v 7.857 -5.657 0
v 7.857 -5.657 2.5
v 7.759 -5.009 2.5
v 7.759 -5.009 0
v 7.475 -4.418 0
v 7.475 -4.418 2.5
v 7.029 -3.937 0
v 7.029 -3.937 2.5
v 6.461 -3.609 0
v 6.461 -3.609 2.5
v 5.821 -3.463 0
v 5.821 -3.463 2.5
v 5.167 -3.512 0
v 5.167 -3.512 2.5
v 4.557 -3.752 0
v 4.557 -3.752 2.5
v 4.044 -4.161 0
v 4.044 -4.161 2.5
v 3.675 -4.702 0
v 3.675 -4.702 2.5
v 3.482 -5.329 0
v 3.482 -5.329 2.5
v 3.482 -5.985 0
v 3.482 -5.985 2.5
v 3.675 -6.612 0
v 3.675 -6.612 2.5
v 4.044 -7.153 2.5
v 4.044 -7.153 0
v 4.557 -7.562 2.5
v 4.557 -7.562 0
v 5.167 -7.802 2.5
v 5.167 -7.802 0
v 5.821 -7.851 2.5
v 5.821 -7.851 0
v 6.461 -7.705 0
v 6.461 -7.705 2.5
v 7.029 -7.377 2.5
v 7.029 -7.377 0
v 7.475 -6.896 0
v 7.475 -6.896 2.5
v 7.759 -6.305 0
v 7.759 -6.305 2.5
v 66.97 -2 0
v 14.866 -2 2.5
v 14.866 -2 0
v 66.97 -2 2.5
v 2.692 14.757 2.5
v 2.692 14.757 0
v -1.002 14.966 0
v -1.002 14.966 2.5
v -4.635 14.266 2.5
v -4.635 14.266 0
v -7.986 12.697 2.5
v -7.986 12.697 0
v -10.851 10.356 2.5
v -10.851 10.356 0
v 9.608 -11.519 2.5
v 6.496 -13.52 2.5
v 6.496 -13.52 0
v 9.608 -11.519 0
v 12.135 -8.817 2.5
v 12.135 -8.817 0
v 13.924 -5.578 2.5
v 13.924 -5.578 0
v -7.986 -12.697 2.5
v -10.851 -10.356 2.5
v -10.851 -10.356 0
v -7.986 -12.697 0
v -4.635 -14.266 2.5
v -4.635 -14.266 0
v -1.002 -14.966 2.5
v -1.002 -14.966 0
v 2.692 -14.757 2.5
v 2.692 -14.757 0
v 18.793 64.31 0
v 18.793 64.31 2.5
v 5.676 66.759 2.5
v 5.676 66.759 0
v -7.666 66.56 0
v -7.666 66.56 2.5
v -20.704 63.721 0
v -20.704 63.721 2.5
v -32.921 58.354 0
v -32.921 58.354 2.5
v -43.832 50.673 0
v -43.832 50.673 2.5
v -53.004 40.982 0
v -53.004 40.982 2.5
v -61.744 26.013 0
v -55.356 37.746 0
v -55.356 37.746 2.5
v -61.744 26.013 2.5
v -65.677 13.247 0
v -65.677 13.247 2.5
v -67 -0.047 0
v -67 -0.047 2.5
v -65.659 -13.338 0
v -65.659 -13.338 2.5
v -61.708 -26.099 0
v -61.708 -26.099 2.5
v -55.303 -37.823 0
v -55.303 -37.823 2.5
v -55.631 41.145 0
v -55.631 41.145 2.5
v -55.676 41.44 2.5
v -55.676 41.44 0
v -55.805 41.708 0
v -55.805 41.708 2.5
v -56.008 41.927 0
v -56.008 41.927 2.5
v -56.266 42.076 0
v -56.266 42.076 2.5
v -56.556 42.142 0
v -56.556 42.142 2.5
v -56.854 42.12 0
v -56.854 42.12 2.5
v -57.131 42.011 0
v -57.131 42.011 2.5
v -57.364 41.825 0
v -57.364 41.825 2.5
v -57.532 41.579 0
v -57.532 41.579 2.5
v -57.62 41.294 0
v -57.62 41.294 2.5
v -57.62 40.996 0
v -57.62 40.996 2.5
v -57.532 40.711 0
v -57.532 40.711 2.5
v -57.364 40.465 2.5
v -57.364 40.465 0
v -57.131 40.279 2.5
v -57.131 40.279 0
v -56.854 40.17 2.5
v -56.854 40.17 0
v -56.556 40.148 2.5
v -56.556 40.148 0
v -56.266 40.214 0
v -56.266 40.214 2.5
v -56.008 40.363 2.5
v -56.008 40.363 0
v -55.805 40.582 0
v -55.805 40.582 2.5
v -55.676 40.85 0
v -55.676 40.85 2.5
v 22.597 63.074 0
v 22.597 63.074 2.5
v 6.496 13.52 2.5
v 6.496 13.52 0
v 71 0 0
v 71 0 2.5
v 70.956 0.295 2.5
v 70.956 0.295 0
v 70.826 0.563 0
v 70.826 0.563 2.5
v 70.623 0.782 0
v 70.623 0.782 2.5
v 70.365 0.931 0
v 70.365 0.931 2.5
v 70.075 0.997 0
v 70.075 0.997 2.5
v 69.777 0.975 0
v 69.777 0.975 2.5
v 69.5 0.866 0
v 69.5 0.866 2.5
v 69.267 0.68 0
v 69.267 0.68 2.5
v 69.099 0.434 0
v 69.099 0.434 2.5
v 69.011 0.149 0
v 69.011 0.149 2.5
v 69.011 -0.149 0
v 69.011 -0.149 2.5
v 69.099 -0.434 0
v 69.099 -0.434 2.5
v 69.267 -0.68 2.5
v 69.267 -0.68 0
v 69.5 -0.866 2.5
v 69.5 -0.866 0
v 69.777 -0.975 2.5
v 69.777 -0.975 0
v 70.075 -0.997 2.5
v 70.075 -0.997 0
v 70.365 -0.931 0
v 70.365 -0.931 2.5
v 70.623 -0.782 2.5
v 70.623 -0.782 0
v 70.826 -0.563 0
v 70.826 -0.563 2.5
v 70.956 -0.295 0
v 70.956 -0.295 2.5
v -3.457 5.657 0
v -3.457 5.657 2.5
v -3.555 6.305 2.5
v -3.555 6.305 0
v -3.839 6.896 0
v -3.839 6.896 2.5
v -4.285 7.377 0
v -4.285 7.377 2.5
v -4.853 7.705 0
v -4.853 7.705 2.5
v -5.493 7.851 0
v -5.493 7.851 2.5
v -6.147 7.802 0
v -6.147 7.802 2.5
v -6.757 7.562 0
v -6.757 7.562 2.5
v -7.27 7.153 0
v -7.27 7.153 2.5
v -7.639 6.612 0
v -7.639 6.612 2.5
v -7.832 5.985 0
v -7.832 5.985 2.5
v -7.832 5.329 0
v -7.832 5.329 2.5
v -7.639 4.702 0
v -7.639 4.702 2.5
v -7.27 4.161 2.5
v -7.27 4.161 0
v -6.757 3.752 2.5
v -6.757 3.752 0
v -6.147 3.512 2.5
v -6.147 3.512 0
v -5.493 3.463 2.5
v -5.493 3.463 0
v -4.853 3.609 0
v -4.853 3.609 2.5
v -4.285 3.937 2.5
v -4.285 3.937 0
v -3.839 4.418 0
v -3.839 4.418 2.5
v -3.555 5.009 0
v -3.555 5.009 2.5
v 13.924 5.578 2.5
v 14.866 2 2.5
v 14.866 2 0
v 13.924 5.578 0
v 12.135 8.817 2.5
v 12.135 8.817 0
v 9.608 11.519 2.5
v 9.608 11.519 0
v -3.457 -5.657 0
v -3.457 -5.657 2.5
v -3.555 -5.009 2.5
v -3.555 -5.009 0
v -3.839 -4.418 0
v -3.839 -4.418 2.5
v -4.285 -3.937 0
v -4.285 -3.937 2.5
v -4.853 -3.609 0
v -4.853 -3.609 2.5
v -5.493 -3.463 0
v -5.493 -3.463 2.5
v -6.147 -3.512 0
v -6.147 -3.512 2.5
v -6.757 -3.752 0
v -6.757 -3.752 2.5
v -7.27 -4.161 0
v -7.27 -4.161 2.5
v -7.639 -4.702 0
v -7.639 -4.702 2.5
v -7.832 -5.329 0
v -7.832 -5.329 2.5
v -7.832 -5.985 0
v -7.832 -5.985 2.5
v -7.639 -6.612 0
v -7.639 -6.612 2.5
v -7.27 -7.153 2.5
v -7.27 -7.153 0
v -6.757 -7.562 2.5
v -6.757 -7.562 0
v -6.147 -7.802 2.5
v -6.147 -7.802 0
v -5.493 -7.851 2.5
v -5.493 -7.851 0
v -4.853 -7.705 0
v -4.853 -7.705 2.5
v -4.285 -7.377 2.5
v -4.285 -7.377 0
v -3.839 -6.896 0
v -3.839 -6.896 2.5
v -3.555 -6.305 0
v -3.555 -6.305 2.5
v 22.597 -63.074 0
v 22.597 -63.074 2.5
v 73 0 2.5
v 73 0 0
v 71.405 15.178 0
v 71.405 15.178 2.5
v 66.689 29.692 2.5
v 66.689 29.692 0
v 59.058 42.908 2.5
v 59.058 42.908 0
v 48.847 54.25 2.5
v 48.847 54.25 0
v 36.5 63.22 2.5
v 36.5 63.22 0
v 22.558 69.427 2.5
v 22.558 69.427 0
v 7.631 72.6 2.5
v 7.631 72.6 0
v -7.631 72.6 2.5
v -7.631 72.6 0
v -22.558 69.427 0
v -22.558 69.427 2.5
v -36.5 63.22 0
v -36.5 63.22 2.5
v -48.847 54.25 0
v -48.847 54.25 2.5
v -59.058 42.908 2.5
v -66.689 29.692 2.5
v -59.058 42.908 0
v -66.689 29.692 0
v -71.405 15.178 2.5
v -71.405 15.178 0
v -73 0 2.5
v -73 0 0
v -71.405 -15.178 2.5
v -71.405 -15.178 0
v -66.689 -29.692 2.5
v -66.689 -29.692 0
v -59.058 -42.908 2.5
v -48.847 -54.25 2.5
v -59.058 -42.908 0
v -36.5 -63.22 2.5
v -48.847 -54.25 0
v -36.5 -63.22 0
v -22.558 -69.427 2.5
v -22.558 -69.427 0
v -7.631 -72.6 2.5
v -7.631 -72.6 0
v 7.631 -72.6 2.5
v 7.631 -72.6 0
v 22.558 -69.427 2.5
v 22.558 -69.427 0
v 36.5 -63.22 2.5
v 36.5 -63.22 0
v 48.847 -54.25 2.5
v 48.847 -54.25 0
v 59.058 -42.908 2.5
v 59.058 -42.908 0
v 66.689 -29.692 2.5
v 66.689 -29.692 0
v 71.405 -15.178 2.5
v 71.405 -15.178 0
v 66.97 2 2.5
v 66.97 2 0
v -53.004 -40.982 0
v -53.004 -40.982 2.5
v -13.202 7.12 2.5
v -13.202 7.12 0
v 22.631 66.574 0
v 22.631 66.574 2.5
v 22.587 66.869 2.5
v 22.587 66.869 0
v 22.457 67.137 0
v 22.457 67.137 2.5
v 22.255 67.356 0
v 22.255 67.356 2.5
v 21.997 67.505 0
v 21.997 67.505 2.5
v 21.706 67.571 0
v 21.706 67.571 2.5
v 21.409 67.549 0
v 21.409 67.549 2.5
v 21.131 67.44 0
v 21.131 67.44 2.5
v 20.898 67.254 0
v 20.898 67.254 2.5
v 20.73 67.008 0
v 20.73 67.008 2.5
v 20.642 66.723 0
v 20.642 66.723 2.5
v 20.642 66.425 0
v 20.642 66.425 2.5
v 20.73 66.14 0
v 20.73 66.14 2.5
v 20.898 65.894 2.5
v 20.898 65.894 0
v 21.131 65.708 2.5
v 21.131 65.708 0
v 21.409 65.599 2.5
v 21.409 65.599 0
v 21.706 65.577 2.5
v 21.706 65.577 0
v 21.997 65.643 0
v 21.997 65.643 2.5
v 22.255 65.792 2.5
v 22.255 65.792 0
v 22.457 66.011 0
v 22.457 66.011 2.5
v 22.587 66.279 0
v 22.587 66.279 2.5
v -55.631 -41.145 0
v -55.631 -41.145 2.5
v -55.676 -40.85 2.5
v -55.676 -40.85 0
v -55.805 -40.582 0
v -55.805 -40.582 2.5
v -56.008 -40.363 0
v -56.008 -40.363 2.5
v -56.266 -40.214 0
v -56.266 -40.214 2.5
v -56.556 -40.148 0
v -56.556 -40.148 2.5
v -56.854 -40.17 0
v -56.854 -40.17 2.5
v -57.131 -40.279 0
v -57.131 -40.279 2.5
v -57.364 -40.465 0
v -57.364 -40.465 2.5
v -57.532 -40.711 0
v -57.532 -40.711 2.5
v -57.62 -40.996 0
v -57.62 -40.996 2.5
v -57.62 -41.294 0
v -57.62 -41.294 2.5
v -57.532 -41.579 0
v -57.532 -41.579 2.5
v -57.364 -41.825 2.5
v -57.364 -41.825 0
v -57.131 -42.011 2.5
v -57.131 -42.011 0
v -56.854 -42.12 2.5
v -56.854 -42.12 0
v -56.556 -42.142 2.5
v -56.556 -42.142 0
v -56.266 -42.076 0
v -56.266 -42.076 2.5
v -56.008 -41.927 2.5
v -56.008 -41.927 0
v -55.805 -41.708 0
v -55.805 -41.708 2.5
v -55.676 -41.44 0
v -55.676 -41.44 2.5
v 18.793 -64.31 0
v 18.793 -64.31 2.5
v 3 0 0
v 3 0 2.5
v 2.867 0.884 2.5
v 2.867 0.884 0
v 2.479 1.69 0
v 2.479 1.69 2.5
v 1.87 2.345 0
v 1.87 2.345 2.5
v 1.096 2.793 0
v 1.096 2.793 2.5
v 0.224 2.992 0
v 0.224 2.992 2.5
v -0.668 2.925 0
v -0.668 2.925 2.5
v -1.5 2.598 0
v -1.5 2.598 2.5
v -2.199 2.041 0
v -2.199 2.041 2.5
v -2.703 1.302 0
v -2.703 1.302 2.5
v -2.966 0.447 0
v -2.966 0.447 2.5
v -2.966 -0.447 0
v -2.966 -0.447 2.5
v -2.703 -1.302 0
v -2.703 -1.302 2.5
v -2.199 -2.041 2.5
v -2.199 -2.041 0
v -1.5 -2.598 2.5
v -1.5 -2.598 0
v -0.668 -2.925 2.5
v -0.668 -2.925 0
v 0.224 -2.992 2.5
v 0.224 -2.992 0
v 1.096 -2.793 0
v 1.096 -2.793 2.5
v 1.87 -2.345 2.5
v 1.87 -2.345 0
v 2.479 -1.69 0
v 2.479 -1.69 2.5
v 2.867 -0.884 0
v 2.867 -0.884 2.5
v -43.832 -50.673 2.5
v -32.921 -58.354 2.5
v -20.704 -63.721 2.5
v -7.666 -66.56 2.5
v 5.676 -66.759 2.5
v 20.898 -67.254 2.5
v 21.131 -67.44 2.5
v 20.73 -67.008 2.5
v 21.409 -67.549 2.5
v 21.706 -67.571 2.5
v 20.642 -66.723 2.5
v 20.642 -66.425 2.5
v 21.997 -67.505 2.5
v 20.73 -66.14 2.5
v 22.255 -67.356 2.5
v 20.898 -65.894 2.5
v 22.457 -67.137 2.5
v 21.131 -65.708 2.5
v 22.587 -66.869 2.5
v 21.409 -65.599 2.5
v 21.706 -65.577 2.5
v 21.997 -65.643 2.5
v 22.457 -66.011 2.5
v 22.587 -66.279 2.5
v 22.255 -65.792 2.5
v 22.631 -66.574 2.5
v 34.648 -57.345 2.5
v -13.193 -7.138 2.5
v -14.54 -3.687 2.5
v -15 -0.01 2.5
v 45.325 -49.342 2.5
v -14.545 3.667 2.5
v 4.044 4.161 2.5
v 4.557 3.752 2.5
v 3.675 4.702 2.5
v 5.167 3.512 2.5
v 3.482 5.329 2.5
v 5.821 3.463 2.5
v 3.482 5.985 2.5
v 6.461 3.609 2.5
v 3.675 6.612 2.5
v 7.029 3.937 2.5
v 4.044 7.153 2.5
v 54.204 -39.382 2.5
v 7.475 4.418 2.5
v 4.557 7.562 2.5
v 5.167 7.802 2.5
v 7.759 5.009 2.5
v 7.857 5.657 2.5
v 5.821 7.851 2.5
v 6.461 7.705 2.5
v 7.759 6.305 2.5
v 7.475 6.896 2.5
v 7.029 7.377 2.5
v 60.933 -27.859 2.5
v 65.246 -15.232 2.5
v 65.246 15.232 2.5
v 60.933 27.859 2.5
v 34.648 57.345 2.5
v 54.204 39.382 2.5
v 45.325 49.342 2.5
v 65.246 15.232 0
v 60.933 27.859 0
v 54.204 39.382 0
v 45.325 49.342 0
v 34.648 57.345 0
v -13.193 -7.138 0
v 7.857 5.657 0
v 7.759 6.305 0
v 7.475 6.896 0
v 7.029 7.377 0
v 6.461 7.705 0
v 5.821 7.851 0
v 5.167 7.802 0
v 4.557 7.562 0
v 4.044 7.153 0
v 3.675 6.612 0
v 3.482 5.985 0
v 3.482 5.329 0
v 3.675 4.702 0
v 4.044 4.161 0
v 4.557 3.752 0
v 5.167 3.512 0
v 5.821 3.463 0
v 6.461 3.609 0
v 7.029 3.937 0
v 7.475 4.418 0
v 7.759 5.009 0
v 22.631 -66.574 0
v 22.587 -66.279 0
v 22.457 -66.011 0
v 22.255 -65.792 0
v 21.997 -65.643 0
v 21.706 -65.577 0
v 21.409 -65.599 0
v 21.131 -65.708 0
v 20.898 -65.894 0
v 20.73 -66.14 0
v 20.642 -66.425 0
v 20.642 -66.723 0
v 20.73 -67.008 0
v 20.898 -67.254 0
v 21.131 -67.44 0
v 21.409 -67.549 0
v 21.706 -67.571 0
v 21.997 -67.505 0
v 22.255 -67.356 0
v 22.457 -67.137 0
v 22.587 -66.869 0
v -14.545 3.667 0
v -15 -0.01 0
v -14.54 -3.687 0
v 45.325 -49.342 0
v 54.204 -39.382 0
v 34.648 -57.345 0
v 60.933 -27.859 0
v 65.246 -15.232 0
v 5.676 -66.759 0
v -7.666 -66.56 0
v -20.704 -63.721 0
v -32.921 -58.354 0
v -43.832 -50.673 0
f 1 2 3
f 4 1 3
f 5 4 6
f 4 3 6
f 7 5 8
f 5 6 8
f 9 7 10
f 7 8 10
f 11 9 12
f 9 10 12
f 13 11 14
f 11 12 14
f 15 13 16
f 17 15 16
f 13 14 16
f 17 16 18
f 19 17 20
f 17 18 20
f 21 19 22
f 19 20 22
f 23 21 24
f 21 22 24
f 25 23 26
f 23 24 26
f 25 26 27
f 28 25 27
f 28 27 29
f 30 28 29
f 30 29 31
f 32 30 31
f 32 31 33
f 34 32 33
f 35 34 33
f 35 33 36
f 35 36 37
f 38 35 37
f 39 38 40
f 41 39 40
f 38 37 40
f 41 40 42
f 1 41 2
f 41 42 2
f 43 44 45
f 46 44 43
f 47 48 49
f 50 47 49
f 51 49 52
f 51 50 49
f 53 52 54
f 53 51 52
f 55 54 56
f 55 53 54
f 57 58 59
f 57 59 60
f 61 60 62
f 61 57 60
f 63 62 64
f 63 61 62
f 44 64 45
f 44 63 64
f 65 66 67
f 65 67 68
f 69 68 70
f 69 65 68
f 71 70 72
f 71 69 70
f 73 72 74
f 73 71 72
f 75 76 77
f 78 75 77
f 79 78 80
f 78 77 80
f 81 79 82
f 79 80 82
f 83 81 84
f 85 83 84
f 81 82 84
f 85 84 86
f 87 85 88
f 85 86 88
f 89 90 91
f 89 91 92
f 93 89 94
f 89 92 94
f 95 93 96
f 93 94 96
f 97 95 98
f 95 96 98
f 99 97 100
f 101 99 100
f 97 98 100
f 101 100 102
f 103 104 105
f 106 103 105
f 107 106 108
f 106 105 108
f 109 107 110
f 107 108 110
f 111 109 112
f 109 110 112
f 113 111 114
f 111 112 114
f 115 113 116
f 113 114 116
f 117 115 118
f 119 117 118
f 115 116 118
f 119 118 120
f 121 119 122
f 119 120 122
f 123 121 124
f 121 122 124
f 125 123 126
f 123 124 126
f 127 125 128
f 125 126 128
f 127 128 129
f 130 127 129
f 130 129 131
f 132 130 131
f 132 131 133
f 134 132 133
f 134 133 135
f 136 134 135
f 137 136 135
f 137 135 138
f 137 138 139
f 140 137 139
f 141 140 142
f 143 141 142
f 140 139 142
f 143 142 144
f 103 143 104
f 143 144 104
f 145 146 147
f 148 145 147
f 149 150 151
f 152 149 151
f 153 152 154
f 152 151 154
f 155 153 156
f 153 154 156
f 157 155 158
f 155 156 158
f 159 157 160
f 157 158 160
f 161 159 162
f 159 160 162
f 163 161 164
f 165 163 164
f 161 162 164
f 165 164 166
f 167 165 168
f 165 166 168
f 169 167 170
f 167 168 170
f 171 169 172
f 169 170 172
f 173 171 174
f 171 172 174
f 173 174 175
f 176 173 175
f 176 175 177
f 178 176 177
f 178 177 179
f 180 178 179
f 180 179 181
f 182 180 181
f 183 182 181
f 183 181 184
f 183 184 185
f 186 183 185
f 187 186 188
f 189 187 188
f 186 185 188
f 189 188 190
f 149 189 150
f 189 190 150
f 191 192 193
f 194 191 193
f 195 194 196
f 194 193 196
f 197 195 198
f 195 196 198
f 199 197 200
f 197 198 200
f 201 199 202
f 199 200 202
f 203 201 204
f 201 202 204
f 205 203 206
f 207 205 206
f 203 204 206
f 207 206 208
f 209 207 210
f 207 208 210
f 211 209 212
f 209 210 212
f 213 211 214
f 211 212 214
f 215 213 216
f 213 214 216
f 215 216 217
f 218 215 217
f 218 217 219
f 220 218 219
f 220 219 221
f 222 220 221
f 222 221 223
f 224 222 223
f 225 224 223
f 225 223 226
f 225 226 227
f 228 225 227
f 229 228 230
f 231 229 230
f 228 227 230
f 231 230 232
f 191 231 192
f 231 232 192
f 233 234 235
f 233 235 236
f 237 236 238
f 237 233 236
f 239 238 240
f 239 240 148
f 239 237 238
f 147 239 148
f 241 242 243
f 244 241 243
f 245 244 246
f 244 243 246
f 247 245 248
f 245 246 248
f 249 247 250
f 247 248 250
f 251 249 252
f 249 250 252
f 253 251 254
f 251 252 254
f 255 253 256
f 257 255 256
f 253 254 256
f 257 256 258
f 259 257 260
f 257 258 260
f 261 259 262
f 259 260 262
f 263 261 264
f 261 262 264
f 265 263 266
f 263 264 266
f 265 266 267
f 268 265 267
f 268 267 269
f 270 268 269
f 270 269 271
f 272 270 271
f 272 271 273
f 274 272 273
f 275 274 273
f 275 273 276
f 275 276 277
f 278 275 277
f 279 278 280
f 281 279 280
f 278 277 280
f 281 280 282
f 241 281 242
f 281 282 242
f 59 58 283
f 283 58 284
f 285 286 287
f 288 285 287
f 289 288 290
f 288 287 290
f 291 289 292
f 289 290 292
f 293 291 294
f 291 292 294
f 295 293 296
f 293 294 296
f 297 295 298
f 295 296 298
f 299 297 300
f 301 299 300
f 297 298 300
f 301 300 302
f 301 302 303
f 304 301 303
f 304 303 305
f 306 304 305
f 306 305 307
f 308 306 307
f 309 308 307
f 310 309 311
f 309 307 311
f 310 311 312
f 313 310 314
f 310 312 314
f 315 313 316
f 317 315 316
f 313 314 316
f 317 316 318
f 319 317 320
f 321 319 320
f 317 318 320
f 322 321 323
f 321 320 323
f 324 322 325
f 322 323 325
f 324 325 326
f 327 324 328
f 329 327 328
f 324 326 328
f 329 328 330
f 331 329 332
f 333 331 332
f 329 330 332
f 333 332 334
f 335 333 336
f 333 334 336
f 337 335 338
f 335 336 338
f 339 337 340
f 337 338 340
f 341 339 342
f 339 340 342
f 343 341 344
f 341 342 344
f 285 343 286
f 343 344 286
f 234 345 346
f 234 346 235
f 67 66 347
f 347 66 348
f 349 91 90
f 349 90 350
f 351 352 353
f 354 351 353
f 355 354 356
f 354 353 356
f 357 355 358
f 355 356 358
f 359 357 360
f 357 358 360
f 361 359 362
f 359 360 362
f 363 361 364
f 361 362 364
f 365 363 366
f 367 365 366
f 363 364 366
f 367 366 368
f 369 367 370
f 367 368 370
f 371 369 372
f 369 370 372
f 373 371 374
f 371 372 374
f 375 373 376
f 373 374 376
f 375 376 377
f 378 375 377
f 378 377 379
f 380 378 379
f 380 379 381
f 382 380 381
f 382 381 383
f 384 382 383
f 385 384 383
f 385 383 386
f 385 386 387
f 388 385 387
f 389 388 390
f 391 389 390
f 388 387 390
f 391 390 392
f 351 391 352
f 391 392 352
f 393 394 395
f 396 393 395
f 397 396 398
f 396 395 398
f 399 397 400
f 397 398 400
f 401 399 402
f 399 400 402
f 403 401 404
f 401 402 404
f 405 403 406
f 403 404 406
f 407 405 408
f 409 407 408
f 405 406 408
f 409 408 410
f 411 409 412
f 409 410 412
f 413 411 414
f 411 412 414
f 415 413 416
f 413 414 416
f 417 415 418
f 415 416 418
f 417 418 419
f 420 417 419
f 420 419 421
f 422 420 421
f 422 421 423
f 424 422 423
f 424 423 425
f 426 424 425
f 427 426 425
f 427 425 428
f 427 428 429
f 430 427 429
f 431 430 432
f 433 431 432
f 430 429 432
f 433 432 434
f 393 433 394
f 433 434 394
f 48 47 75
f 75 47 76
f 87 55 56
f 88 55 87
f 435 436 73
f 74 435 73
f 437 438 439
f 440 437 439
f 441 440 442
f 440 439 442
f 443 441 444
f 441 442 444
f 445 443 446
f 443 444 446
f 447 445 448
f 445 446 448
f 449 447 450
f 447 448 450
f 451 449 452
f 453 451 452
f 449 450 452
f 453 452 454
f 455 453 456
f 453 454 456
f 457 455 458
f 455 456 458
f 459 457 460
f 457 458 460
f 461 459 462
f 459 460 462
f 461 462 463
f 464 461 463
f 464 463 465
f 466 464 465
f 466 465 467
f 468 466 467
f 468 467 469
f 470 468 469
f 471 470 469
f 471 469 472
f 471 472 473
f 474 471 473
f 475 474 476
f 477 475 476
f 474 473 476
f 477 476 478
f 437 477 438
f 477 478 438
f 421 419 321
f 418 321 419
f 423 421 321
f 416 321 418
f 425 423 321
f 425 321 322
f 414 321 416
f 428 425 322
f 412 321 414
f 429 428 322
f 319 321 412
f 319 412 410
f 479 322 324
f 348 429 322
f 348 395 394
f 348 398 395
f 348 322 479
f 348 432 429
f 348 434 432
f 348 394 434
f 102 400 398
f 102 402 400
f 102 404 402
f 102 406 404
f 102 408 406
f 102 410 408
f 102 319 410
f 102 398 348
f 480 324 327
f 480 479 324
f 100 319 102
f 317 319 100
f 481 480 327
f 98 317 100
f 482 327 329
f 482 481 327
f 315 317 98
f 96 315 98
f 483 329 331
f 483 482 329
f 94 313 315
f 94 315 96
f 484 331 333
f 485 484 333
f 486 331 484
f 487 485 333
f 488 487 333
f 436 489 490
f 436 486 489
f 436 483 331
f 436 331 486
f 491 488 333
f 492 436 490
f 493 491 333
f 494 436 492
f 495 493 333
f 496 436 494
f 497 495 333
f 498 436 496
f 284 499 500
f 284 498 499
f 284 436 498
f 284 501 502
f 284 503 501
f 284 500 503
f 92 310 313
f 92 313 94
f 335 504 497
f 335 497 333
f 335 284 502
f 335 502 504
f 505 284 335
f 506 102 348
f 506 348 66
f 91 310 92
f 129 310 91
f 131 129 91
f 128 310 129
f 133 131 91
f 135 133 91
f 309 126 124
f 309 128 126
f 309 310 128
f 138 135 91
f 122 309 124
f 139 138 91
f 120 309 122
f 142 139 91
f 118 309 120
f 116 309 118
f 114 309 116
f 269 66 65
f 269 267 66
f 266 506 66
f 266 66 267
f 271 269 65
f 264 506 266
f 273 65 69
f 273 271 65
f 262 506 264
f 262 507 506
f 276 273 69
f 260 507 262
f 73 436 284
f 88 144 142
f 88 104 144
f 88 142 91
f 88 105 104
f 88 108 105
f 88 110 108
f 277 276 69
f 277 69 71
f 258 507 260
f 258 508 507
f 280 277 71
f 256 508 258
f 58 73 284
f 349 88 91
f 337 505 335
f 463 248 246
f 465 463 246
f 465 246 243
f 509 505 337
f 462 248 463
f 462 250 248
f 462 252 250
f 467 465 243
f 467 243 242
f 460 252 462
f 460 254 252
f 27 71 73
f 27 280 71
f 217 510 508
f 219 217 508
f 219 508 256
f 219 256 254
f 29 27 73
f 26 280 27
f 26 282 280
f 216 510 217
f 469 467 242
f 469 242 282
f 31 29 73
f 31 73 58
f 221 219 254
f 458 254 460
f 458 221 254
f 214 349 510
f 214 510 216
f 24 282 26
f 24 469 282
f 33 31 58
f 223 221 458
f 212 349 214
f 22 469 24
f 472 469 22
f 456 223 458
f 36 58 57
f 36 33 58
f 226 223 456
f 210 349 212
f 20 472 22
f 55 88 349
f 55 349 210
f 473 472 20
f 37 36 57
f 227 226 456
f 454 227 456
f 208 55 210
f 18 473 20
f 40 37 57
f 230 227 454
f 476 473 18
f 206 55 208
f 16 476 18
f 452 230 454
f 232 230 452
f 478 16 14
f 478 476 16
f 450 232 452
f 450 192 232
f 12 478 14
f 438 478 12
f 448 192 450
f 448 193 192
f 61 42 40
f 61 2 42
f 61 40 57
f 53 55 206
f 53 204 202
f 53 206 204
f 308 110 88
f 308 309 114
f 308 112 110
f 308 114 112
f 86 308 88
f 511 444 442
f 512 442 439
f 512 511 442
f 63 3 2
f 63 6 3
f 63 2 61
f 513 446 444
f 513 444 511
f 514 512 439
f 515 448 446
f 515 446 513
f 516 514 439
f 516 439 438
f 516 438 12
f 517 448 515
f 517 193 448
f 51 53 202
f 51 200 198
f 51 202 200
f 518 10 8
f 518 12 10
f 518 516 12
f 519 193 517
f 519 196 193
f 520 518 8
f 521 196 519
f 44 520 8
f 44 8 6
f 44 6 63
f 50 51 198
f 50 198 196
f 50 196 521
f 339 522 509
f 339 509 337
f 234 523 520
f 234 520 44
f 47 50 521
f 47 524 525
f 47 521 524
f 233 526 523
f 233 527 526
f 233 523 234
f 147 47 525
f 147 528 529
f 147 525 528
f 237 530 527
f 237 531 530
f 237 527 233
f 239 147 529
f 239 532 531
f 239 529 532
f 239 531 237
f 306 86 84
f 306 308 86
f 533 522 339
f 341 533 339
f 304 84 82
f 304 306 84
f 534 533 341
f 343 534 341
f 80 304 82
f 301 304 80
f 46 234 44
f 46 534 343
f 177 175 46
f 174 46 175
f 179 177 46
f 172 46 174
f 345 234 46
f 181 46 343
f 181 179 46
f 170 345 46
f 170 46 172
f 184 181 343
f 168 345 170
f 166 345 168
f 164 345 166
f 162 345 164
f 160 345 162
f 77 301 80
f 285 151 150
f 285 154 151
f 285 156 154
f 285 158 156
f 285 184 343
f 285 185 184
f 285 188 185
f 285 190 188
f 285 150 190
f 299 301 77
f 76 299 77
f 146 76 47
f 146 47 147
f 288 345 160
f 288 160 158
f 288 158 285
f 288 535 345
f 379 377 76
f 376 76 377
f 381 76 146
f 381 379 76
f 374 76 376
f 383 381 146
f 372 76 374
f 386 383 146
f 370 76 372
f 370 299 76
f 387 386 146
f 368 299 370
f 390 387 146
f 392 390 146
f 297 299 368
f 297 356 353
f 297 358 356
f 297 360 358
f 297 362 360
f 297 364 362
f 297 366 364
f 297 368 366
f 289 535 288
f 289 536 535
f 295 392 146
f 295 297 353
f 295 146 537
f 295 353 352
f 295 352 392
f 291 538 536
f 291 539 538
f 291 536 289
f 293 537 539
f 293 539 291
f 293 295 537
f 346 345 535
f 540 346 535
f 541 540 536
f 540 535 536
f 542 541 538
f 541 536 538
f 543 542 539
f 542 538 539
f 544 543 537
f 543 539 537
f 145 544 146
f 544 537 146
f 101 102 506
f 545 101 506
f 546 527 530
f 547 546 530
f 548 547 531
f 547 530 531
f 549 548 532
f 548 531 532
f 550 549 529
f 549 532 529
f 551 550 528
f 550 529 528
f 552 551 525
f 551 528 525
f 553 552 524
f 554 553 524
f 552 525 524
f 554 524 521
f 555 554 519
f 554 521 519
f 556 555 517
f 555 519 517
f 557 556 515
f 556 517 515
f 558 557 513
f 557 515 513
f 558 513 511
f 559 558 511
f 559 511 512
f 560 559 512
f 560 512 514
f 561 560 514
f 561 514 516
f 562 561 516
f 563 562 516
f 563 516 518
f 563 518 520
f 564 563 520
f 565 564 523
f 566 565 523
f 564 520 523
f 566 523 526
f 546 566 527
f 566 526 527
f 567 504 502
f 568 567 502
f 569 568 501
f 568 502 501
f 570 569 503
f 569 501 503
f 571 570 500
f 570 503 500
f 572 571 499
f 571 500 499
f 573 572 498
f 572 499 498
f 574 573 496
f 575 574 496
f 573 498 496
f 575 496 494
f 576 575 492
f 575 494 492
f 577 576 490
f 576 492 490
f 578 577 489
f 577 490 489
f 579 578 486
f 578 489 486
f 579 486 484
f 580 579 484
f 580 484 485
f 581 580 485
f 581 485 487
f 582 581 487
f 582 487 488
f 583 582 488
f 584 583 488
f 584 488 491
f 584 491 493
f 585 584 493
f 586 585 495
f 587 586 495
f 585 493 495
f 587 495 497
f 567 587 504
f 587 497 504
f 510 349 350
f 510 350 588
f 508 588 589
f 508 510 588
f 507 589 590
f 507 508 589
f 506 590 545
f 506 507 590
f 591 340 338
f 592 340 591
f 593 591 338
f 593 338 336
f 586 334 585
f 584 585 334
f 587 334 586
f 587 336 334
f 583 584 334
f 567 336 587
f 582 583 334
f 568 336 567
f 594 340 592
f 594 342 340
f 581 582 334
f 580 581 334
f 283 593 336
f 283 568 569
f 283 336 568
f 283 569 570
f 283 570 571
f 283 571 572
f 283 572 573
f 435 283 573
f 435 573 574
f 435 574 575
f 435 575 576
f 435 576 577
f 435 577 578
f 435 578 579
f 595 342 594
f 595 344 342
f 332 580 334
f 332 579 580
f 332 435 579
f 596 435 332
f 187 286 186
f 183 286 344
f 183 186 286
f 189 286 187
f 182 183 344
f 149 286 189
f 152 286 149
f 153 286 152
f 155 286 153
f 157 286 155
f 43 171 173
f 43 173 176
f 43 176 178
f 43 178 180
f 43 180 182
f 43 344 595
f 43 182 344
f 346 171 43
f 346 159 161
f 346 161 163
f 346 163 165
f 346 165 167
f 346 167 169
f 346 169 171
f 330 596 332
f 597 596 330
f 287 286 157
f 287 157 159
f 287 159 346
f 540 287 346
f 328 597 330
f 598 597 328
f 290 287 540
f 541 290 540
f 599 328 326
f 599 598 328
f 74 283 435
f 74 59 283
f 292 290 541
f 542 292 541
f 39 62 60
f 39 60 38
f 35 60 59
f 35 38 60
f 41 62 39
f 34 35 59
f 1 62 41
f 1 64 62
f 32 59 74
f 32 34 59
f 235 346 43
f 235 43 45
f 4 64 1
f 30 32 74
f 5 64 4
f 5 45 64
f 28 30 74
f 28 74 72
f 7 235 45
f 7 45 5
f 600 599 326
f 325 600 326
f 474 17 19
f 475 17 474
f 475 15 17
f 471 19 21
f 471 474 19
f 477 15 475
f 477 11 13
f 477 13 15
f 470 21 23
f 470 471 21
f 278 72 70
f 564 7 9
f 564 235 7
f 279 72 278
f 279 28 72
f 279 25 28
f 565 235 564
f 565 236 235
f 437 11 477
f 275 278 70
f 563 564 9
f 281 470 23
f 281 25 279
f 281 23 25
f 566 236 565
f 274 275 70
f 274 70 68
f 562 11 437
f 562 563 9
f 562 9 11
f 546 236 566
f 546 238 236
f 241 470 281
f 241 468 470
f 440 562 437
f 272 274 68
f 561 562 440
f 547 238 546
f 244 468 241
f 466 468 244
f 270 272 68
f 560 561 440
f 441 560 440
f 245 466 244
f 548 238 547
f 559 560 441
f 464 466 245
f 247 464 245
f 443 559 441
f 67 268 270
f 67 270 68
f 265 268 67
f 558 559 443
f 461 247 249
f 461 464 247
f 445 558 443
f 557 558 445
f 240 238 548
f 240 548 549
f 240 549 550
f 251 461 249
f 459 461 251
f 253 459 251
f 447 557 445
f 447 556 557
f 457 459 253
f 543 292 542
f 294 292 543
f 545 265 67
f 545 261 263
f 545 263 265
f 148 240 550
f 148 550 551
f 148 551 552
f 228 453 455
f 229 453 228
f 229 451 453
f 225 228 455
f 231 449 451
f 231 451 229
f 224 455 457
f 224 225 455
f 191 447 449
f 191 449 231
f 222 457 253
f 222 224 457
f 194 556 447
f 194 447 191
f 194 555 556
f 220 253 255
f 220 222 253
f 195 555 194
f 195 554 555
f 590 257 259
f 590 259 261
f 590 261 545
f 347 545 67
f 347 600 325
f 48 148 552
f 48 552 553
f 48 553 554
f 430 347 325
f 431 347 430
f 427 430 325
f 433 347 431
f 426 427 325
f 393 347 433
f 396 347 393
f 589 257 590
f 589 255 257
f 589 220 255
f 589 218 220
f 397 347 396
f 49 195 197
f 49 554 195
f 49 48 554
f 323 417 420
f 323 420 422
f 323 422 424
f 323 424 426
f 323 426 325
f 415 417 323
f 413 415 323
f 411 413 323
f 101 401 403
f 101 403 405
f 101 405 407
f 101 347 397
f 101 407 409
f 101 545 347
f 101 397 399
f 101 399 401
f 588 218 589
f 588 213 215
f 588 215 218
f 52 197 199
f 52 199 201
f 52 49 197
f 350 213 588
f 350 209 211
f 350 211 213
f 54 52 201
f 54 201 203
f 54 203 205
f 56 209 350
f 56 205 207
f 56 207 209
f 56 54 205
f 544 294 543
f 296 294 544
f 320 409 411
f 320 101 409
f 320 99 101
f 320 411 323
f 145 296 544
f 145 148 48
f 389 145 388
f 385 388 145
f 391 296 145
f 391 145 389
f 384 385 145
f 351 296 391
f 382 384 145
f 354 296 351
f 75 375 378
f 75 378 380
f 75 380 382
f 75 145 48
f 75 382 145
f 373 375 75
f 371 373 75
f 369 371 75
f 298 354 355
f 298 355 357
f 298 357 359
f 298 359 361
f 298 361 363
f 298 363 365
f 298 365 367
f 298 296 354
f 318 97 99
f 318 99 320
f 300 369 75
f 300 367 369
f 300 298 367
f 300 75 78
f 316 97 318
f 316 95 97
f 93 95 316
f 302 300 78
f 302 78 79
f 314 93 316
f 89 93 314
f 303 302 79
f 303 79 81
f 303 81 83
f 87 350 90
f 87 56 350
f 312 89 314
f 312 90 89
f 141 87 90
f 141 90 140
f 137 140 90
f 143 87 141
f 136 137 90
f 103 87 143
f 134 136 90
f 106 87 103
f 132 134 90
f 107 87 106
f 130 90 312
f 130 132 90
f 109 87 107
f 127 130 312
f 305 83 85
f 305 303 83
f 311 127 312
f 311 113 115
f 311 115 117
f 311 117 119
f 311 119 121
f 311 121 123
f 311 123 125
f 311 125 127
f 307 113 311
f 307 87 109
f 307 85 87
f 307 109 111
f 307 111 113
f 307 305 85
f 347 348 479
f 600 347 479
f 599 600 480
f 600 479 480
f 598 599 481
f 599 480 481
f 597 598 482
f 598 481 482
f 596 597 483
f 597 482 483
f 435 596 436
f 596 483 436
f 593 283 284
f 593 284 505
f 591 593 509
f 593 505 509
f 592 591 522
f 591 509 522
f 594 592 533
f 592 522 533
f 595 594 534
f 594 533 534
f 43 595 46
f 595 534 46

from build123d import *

# Parameters (mm, degrees)
SKETCH_3_R          = 73
EXTRUDE_3_DEPTH     = 2.5
SKETCH_5_R          = 67
CUT_EXTRUDE_1_DEPTH = 2.5
SKETCH_6_R          = 15
EXTRUDE_4_DEPTH     = 2.5
SKETCH_7_R          = 8
CUT_EXTRUDE_2_DEPTH = 2.5
EXTRUDE_6_DEPTH     = 2.5
EXTRUDE_7_DEPTH     = 2.5
EXTRUDE_8_DEPTH     = 2.5
EXTRUDE_9_DEPTH     = 2.5
EXTRUDE_10_DEPTH    = 2.5
SKETCH_14_R         = 8
CUT_EXTRUDE_3_DEPTH = 2.5
SKETCH_15_R         = 1
CUT_EXTRUDE_4_DEPTH = 2.5
SKETCH_16_R         = 8
EXTRUDE_11_DEPTH    = 2.5
SKETCH_17_R         = 3
CUT_EXTRUDE_5_DEPTH = 2.5
SKETCH_18_R         = 3.25
SKETCH_18_R_2       = 2.2
CUT_EXTRUDE_6_DEPTH = 2.5
SKETCH_19_R         = 3.25
EXTRUDE_12_DEPTH    = 2.5
SKETCH_20_R         = 2.2
CUT_EXTRUDE_7_DEPTH = 2.5


with BuildPart() as part:
    # 草图3 → 凸台-拉伸3 (new body)
    with BuildSketch(Plane.XY):
        Circle(SKETCH_3_R)
    extrude(amount=EXTRUDE_3_DEPTH)

    # 草图5 → 切除-拉伸1 (cut)
    with BuildSketch(Plane.XY.offset(2.5)):
        Circle(SKETCH_5_R)
    extrude(amount=-CUT_EXTRUDE_1_DEPTH, mode=Mode.SUBTRACT)



with BuildPart() as body_2:
    # 草图6 → 凸台-拉伸4 (new body)
    with BuildSketch(Plane.XY.offset(2.5)):
        Circle(SKETCH_6_R)
    extrude(amount=-EXTRUDE_4_DEPTH)

    # 草图7 → 切除-拉伸2 (cut)
    with BuildSketch(Plane.XY.offset(2.5)):
        Circle(SKETCH_7_R)
    extrude(amount=-CUT_EXTRUDE_2_DEPTH, mode=Mode.SUBTRACT)


with BuildPart() as part_1:
    add(part.part)

    add(body_2.part)  # 凸台-拉伸6 merges body 2
    # 草图9 → 凸台-拉伸6 (add)
    with BuildSketch(Plane.XY.offset(2.5)):
        with BuildLine():
            Line((0, 2), (0, 0))
            Line((0, 0), (0, -2))
            Line((0, -2), (66.970142601, -2))
            ThreePointArc((66.970142601, -2), (67, 0), (66.970142601, 2))
            Line((66.970142601, 2), (0, 2))
        make_face()
    extrude(amount=-EXTRUDE_6_DEPTH)

    # 草图10 → 凸台-拉伸7 (add)
    with BuildSketch(Plane.XY.offset(2.5)):
        with BuildLine():
            Line((1.902113033, -0.618033989), (0, 0))
            Line((0, 0), (-1.902113033, 0.618033989))
            Line((-1.902113033, 0.618033989), (18.792799147, 64.310424507))
            ThreePointArc((18.792799147, 64.310424507), (20.704138623, 63.720786592), (22.597025212, 63.074356529))
            Line((22.597025212, 63.074356529), (1.902113033, -0.618033989))
        make_face()
    extrude(amount=-EXTRUDE_7_DEPTH)

    # 草图11 → 凸台-拉伸8 (add)
    with BuildSketch(Plane.XY.offset(2.5)):
        with BuildLine():
            Line((0, 0), (1.175570505, 1.618033989))
            Line((1.175570505, 1.618033989), (-53.004412975, 40.982096154))
            ThreePointArc((-53.004412975, 40.982096154), (-54.204138623, 39.381611904), (-55.355553985, 37.746028176))
            Line((-55.355553985, 37.746028176), (-1.175570505, -1.618033989))
            Line((-1.175570505, -1.618033989), (0, 0))
        make_face()
    extrude(amount=-EXTRUDE_8_DEPTH)

    # 草图12 → 凸台-拉伸9 (add)
    with BuildSketch(Plane.XY.offset(2.5)):
        with BuildLine():
            Line((0, 0), (1.175570505, -1.618033989))
            Line((1.175570505, -1.618033989), (-53.004412975, -40.982096154))
            ThreePointArc((-53.004412975, -40.982096154), (-54.176759621, -39.419268347), (-55.30304181, -37.822923823))
            Line((-55.30304181, -37.822923823), (-1.175570505, 1.618033989))
            Line((-1.175570505, 1.618033989), (0, 0))
        make_face()
    extrude(amount=-EXTRUDE_9_DEPTH)

    # 草图13 → 凸台-拉伸10 (add)
    with BuildSketch(Plane.XY.offset(2.5)):
        with BuildLine():
            Line((0, 0), (1.902113033, 0.618033989))
            Line((1.902113033, 0.618033989), (22.597025212, -63.074356529))
            ThreePointArc((22.597025212, -63.074356529), (20.704138623, -63.720786592), (18.792799147, -64.310424507))
            Line((18.792799147, -64.310424507), (-1.902113033, -0.618033989))
            Line((-1.902113033, -0.618033989), (0, 0))
        make_face()
    extrude(amount=-EXTRUDE_10_DEPTH)

    # 草图14 → 切除-拉伸3 (cut)
    with BuildSketch(Plane.XY.offset(2.5)):
        Circle(SKETCH_14_R)
    extrude(amount=-CUT_EXTRUDE_3_DEPTH, mode=Mode.SUBTRACT)

    # 草图15 → 切除-拉伸4 (cut)
    with BuildSketch(Plane.XY.offset(2.5)):
        with Locations((70, 0)):
            Circle(SKETCH_15_R)
        with Locations((21.631189606, 66.573956141)):
            Circle(SKETCH_15_R)
        with Locations((-56.631189606, 41.14496766)):
            Circle(SKETCH_15_R)
        with Locations((-56.631189606, -41.14496766)):
            Circle(SKETCH_15_R)
        with Locations((21.631189606, -66.573956141)):
            Circle(SKETCH_15_R)
    extrude(amount=-CUT_EXTRUDE_4_DEPTH, mode=Mode.SUBTRACT)

    # 草图16 → 凸台-拉伸11 (add)
    with BuildSketch(Plane.XY.offset(2.5)):
        Circle(SKETCH_16_R)
    extrude(amount=-EXTRUDE_11_DEPTH)

    # 草图17 → 切除-拉伸5 (cut)
    with BuildSketch(Plane.XY.offset(2.5)):
        Circle(SKETCH_17_R)
    extrude(amount=-CUT_EXTRUDE_5_DEPTH, mode=Mode.SUBTRACT)

    # 草图18 → 切除-拉伸6 (cut)
    with BuildSketch(Plane.XY.offset(2.5)):
        with Locations((5.657, 5.657)):
            Circle(SKETCH_18_R)
        with Locations((-5.657, -5.657)):
            Circle(SKETCH_18_R)
        with Locations((5.657, -5.657)):
            Circle(SKETCH_18_R_2)
        with Locations((-5.657, 5.657)):
            Circle(SKETCH_18_R_2)
    extrude(amount=-CUT_EXTRUDE_6_DEPTH, mode=Mode.SUBTRACT)

    # 草图19 → 凸台-拉伸12 (add)
    with BuildSketch(Plane.XY.offset(2.5)):
        with Locations((5.657, 5.657)):
            Circle(SKETCH_19_R)
        with Locations((-5.657, -5.657)):
            Circle(SKETCH_19_R)
    extrude(amount=-EXTRUDE_12_DEPTH)

    # 草图20 → 切除-拉伸7 (cut)
    with BuildSketch(Plane.XY.offset(2.5)):
        with Locations((5.657, 5.657)):
            Circle(SKETCH_20_R)
        with Locations((-5.657, -5.657)):
            Circle(SKETCH_20_R)
    extrude(amount=-CUT_EXTRUDE_7_DEPTH, mode=Mode.SUBTRACT)


solid = part_1.part
